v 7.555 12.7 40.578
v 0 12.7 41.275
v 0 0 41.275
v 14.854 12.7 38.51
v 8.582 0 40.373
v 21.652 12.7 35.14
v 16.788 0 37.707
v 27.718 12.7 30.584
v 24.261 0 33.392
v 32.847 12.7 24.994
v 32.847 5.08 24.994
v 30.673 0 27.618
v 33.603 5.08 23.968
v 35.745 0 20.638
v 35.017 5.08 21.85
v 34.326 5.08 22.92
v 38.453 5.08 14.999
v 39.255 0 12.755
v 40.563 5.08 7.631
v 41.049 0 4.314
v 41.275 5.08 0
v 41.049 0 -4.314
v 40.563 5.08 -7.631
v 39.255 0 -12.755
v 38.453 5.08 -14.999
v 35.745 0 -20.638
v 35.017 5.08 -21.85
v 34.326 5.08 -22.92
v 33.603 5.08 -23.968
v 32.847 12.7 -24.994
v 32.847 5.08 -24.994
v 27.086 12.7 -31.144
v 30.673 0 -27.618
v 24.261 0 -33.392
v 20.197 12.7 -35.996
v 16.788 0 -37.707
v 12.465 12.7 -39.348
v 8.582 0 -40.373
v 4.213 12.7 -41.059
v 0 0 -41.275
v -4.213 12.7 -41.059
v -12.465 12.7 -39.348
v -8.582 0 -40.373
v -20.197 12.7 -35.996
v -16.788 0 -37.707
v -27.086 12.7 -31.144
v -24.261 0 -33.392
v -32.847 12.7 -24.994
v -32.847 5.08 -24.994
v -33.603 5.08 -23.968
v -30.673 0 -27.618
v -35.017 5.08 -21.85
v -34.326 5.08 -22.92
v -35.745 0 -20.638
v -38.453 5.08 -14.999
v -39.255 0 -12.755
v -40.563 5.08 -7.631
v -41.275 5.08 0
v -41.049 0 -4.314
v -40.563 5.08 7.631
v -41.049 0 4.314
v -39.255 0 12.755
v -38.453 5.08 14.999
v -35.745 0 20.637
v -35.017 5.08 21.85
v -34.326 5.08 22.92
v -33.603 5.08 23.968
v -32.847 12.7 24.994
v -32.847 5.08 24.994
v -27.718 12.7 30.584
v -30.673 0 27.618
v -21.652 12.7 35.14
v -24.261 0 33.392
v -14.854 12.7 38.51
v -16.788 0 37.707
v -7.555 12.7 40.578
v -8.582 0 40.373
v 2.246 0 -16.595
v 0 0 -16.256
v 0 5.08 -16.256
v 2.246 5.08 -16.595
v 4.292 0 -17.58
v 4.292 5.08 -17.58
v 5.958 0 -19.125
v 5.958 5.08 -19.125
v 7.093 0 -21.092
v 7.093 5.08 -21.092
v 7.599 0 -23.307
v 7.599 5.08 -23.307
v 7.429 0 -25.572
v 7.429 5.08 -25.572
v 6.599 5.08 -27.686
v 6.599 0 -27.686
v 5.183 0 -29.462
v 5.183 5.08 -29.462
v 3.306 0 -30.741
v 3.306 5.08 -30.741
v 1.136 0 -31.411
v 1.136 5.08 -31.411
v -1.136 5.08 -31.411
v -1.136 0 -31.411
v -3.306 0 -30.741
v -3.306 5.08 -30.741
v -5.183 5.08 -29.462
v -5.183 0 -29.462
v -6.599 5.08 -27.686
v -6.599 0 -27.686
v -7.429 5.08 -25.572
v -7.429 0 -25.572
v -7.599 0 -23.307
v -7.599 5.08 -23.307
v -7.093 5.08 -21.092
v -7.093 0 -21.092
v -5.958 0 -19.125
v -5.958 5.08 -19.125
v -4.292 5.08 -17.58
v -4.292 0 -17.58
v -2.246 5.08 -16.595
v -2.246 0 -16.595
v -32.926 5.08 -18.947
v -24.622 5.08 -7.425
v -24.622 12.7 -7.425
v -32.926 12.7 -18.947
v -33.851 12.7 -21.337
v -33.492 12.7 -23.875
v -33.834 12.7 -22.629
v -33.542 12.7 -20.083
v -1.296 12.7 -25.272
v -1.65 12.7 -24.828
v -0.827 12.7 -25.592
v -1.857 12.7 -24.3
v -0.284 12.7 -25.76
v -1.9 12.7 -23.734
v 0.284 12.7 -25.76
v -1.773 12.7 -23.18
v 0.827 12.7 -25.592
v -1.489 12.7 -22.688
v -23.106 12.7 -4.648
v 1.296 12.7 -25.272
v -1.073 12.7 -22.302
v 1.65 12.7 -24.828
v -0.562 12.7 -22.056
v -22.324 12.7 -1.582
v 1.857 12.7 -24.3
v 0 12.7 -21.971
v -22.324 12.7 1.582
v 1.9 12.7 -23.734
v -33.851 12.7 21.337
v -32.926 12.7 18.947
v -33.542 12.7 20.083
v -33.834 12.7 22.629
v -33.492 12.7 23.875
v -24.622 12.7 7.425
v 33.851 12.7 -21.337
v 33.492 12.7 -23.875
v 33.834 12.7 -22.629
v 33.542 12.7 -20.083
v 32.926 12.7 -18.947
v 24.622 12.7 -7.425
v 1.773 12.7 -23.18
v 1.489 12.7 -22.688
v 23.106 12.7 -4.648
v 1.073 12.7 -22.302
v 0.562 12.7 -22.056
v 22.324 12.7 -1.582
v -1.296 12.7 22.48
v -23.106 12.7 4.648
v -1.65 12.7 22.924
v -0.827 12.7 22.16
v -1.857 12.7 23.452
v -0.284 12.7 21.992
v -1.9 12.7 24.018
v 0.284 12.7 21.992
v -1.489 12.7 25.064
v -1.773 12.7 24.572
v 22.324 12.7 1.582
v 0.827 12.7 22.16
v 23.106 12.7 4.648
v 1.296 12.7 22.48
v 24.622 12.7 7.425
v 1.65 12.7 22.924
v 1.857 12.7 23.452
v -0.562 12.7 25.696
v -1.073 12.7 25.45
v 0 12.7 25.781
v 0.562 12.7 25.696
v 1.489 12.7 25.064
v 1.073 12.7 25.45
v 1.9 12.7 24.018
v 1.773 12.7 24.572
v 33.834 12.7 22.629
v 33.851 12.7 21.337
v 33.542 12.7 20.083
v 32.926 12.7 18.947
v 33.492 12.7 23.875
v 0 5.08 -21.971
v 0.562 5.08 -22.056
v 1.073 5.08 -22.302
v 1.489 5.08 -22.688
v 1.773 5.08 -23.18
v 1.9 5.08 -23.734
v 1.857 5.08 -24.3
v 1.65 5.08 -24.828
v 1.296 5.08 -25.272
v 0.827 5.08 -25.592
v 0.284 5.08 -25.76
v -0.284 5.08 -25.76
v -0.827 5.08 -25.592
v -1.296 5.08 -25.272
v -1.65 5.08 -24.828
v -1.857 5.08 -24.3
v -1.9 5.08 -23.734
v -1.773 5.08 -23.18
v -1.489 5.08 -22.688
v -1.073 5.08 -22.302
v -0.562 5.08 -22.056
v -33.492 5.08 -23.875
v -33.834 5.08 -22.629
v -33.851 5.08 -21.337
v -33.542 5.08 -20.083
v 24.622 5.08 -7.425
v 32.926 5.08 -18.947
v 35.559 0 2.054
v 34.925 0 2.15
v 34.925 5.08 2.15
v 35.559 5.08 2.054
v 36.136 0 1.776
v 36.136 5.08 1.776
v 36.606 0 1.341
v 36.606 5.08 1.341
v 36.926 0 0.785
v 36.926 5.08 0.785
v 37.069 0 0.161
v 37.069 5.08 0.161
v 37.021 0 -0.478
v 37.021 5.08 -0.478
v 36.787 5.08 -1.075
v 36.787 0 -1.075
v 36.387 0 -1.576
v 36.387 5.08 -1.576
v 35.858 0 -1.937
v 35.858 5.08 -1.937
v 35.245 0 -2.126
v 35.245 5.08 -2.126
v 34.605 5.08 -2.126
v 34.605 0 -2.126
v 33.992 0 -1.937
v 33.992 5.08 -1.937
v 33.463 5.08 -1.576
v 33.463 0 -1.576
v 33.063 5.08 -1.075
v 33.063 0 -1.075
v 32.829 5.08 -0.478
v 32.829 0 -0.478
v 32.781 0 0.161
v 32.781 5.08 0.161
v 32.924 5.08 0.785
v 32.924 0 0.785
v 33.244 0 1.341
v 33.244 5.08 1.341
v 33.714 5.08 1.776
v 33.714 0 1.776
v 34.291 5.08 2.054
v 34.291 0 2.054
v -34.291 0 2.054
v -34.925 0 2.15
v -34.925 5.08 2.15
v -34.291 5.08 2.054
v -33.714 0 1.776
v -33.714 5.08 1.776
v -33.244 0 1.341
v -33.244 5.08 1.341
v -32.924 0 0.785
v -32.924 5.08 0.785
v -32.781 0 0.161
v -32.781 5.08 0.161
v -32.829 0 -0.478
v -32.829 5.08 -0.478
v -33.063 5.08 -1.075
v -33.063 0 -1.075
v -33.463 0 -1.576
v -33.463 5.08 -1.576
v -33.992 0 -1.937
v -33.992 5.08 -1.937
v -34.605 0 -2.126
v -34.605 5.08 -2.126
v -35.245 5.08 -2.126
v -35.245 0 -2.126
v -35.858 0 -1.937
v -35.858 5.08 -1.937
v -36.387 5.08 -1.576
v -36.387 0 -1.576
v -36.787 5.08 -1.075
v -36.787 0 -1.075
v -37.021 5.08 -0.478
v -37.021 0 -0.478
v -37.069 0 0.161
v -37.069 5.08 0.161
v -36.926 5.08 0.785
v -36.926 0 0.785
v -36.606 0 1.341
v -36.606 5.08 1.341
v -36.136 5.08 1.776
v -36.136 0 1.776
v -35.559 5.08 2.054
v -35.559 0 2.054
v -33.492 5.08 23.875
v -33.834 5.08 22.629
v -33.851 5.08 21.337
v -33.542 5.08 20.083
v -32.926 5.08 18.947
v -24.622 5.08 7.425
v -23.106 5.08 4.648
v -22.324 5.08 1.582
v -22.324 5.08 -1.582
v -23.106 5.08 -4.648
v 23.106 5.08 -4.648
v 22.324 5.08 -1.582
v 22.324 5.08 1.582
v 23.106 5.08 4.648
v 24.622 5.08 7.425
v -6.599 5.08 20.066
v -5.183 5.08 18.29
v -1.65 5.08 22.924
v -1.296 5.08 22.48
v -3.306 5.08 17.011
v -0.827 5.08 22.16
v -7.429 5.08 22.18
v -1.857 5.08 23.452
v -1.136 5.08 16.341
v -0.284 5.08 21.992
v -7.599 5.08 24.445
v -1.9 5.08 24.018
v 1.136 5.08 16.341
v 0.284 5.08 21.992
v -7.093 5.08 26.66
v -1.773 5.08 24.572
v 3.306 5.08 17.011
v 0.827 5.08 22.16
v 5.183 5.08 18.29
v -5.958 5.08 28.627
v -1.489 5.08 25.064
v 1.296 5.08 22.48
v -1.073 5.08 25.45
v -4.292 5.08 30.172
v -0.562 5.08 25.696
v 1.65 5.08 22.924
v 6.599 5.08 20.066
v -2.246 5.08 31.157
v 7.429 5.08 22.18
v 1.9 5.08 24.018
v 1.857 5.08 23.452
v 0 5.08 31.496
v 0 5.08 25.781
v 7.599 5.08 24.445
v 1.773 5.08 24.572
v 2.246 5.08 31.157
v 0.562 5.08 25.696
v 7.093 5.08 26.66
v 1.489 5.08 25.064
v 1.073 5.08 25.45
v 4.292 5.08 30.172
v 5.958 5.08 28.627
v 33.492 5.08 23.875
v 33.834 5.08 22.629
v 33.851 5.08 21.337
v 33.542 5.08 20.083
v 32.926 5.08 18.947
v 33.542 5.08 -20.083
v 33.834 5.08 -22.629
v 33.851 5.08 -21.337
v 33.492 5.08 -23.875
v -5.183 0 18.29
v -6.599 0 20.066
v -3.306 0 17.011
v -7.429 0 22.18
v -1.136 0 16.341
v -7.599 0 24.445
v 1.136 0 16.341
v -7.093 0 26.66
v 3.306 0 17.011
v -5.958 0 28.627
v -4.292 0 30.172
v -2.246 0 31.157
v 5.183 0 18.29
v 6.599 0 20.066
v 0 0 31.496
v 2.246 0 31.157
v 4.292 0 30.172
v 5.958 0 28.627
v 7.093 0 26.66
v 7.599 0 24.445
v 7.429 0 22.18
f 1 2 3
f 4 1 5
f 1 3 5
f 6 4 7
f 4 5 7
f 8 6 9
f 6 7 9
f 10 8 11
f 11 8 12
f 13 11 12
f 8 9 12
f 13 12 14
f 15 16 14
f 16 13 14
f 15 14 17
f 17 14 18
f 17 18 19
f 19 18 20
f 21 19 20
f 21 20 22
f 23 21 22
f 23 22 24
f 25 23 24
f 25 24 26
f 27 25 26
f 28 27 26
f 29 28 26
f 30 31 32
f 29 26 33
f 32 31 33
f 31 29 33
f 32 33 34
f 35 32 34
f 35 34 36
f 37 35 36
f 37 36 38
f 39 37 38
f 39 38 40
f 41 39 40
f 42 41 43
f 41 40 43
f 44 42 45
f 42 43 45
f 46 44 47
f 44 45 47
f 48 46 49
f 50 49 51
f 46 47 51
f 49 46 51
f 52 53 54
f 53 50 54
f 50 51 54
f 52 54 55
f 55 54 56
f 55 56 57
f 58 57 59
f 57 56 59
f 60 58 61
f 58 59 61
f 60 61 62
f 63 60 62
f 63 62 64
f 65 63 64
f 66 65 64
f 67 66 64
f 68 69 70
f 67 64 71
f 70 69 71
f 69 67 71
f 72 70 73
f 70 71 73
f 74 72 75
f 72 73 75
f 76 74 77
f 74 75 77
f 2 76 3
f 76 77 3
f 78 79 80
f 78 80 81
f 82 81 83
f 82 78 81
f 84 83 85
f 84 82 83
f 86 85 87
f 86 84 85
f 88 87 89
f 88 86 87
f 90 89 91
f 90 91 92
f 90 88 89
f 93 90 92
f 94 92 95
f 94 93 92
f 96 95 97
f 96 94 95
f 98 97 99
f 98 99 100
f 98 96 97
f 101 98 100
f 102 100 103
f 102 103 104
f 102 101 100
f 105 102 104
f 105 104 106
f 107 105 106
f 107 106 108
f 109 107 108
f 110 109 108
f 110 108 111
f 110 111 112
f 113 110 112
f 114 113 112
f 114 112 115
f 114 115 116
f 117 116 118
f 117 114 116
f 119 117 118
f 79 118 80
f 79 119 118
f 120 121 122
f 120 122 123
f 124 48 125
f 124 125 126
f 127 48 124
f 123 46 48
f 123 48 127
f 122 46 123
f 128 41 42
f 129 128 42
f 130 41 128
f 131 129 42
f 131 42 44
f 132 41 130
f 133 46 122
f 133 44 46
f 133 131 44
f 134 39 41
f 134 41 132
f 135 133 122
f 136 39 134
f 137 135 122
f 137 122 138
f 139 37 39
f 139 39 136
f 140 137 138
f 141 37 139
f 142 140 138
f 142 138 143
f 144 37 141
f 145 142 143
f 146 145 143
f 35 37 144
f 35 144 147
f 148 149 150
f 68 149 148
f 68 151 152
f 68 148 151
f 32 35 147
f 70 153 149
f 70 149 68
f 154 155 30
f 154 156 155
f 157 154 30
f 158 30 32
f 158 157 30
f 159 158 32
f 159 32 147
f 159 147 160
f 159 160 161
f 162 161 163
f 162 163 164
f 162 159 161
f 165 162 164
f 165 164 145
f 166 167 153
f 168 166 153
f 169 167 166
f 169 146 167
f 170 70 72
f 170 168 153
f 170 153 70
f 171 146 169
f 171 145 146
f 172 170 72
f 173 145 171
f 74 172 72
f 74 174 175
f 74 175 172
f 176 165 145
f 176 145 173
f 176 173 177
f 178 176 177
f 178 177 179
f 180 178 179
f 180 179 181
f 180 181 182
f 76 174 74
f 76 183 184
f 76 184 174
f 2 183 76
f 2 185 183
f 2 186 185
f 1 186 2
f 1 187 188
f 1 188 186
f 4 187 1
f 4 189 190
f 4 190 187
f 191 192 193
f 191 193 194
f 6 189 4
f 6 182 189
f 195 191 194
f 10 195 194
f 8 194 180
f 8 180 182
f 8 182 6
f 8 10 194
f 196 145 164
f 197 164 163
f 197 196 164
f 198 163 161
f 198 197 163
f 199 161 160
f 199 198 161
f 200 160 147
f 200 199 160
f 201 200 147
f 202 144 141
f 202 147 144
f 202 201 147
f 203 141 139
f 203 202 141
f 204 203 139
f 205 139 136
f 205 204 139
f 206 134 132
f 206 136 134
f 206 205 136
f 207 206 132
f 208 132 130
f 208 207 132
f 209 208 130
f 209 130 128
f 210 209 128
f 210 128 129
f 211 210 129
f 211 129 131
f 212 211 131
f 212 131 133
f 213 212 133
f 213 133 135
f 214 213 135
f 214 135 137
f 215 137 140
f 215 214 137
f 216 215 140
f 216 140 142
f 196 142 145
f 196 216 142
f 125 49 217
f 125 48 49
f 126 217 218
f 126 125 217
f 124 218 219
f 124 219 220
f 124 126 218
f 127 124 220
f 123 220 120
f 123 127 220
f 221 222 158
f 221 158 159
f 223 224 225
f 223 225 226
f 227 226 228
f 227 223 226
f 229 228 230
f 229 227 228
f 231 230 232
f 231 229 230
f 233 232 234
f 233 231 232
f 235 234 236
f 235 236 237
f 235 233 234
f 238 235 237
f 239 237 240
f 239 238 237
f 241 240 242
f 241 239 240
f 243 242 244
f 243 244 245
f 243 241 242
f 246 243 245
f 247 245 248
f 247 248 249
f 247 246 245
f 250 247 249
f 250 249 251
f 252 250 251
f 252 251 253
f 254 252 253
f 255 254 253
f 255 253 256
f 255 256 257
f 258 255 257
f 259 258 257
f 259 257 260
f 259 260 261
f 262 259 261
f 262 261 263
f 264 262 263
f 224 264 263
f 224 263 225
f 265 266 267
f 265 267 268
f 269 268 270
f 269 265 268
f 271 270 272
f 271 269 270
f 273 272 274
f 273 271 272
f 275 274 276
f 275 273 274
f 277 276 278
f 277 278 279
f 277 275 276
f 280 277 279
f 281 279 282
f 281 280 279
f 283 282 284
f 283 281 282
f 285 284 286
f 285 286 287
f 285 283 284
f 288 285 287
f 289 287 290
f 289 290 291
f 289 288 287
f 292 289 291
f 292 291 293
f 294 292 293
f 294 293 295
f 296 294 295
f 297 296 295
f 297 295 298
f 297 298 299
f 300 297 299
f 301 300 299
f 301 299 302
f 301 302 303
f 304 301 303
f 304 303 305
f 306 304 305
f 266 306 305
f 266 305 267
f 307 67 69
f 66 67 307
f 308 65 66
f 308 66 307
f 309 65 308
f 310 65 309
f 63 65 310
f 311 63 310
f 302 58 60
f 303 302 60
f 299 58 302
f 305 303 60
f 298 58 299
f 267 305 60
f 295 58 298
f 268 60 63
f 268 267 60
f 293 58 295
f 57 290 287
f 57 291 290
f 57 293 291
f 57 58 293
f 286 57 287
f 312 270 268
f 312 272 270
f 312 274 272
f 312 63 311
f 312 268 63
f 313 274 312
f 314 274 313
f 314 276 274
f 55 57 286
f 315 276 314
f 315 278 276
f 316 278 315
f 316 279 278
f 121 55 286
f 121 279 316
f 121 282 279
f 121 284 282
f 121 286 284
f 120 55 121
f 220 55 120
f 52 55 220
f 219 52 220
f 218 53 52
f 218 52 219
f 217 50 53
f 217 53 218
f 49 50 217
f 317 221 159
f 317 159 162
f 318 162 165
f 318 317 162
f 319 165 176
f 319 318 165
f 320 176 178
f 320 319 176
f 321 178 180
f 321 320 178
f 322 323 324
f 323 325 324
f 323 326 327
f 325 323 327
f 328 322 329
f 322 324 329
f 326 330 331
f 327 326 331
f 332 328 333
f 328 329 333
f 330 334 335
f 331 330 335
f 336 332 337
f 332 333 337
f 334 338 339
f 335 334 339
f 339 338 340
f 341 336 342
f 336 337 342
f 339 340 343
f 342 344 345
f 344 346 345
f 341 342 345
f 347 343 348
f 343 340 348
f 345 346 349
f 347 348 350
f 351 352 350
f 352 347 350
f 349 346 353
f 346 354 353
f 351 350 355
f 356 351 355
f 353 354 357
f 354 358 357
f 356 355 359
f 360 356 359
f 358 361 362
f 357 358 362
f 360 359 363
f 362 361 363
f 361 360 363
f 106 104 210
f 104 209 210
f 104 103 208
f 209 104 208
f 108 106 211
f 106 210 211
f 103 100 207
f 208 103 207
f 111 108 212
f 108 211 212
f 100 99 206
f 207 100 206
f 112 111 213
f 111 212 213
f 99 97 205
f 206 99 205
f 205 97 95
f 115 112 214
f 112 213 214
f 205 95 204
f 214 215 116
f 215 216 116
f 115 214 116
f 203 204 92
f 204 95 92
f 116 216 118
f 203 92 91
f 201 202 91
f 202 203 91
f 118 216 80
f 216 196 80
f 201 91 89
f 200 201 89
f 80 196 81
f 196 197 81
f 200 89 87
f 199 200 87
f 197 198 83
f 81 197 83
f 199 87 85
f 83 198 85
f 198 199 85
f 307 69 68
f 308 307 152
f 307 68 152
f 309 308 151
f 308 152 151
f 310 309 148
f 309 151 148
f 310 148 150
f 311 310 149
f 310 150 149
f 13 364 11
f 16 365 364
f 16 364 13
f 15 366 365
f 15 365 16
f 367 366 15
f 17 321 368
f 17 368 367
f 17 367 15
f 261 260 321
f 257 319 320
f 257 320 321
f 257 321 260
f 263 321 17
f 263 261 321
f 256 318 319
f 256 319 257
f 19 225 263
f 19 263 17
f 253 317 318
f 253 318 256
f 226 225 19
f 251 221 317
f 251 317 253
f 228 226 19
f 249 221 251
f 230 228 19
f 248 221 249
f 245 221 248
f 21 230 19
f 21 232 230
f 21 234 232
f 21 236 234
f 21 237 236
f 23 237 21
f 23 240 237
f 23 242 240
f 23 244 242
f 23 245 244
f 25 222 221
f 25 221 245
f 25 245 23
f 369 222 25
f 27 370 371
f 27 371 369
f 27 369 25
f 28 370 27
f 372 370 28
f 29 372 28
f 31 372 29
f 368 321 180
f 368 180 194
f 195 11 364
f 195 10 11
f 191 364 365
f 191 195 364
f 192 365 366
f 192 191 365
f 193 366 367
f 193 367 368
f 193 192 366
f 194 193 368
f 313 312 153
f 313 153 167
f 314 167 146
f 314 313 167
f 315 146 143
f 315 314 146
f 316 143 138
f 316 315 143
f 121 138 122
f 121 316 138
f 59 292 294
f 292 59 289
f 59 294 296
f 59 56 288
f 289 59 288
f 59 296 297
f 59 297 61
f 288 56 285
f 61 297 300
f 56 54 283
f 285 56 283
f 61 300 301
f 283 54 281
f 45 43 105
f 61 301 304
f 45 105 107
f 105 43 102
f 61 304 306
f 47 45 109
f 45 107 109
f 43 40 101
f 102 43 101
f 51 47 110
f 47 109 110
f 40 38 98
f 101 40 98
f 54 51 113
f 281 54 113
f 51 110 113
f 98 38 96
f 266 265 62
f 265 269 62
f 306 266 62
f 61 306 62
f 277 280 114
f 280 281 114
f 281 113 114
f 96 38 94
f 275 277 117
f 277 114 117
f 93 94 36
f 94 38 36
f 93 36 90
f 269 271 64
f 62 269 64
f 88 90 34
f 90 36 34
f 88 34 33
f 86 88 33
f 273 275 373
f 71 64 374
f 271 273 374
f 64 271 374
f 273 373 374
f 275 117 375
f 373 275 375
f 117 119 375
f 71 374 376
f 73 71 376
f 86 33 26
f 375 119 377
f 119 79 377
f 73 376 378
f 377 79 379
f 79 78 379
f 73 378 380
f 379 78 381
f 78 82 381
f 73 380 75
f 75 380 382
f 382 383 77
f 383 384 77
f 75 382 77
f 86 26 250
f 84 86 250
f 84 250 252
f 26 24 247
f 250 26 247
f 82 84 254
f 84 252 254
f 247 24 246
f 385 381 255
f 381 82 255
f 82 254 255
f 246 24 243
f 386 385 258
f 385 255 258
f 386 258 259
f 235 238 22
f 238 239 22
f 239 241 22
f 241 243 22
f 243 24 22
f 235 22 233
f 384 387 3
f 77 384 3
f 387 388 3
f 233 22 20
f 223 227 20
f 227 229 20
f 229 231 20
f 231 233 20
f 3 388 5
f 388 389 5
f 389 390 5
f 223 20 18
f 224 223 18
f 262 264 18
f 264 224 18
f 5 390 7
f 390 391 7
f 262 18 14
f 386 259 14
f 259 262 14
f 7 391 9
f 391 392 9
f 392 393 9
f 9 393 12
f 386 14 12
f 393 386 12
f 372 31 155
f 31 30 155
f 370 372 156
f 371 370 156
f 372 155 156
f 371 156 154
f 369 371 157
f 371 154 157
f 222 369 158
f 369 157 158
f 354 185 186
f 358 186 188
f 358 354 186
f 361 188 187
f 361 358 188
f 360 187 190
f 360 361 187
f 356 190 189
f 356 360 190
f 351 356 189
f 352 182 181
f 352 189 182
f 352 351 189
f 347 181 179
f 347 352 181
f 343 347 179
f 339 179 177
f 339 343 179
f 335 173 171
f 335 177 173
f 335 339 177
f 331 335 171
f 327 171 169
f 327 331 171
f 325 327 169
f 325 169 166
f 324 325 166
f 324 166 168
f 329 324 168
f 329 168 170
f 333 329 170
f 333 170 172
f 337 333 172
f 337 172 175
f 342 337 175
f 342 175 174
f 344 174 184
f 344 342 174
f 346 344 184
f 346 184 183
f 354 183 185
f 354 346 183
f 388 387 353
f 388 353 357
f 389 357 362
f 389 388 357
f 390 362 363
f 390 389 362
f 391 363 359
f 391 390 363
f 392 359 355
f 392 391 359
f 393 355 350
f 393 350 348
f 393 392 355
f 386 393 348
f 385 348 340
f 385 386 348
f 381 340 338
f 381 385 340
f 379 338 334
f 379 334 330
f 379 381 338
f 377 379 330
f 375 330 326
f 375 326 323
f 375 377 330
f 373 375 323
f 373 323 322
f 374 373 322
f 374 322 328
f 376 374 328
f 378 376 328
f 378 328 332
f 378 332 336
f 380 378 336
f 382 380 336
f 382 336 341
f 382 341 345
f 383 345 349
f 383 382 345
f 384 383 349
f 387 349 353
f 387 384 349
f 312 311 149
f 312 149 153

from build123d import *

# Parameters (mm, degrees)
SKETCH1_R           = 41.275
BOSS_EXTRUDE1_DEPTH = 12.7
SKETCH1_4_R         = 2.15
SKETCH1_4_R_2       = 1.905
CUT_EXTRUDE2_DEPTH  = 60.737268518
SKETCH1_5_R         = 7.62
SKETCH1_5_R_2       = 1.905
CUT_EXTRUDE3_DEPTH  = 5.08
CUT_EXTRUDE4_START  = 5.08
SKETCH1_6_R         = 2.15
CUT_EXTRUDE4_DEPTH  = 7.62
FILLET1_R           = 5.08


with BuildPart() as part:
    # Sketch1 → Boss-Extrude1 (new body)
    with BuildSketch(Plane(origin=(0, 0, 0), x_dir=(1, 0, 0), z_dir=(0, 1, 0))):
        with Locations(Location((0, 0, 0), (0, 0, 270))):
            Circle(SKETCH1_R)
    extrude(amount=BOSS_EXTRUDE1_DEPTH)

    # Sketch1<4> → Cut-Extrude2 (cut, through all)
    with BuildSketch(Plane(origin=(0, 0, 0), x_dir=(1, 0, 0), z_dir=(0, 1, 0))):
        with Locations(Location((-34.925, 0, 0), (0, 0, 270))):
            Circle(SKETCH1_4_R)
        with Locations(Location((34.925, 0, 0), (0, 0, 270))):
            Circle(SKETCH1_4_R)
        with Locations(Location((0, 23.876, 0), (0, 0, 270))):
            Circle(SKETCH1_4_R_2)
        with Locations(Location((0, -23.876, 0), (0, 0, 270))):
            Circle(SKETCH1_4_R_2)
    extrude(amount=CUT_EXTRUDE2_DEPTH, mode=Mode.SUBTRACT)

    # Sketch1<5> → Cut-Extrude3 (cut)
    # profile 1 of 2: a face of its own
    with BuildSketch(Plane(origin=(0, 0, 0), x_dir=(1, 0, 0), z_dir=(0, 1, 0))):
        with Locations(Location((0, -23.876, 0), (0, 0, 270))):
            Circle(SKETCH1_5_R)
        with Locations(Location((0, -23.876, 0), (0, 0, 270))):
            Circle(SKETCH1_5_R_2, mode=Mode.SUBTRACT)
    # profile 2 of 2: a face of its own
    with BuildSketch(Plane(origin=(0, 0, 0), x_dir=(1, 0, 0), z_dir=(0, 1, 0))):
        with Locations(Location((0, 23.876, 0), (0, 0, 270))):
            Circle(SKETCH1_5_R)
        with Locations(Location((0, 23.876, 0), (0, 0, 270))):
            Circle(SKETCH1_5_R_2, mode=Mode.SUBTRACT)
    extrude(amount=CUT_EXTRUDE3_DEPTH, mode=Mode.SUBTRACT)

    # Sketch1<6> → Cut-Extrude4 (cut)
    # profile 1 of 2: a face of its own
    with BuildSketch(Plane(origin=(0, 0, 0), x_dir=(1, 0, 0), z_dir=(0, 1, 0)).offset(CUT_EXTRUDE4_START)):
        with BuildLine():
            ThreePointArc((-35.017363636, 21.849710958), (-41.275, 0), (-35.017363636, -21.849710958))
            Line((-35.017363636, -21.849710958), (-24.621881181, -7.425344611))
            ThreePointArc((-24.621881181, -7.425344611), (-22.225, 0), (-24.621881181, 7.425344611))
            Line((-24.621881181, 7.425344611), (-35.017363636, 21.849710958))
        make_face()
        with Locations(Location((-34.925, 0, 0), (0, 0, 270))):
            Circle(SKETCH1_6_R, mode=Mode.SUBTRACT)
    # profile 2 of 2: a face of its own
    with BuildSketch(Plane(origin=(0, 0, 0), x_dir=(1, 0, 0), z_dir=(0, 1, 0)).offset(CUT_EXTRUDE4_START)):
        with BuildLine():
            Line((35.017363636, 21.849710958), (24.621881181, 7.425344611))
            ThreePointArc((24.621881181, 7.425344611), (22.225, 0), (24.621881181, -7.425344611))
            Line((24.621881181, -7.425344611), (35.017363636, -21.849710958))
            ThreePointArc((35.017363636, -21.849710958), (41.275, 0), (35.017363636, 21.849710958))
        make_face()
        with Locations(Location((34.925, 0, 0), (0, 0, 270))):
            Circle(SKETCH1_6_R, mode=Mode.SUBTRACT)
    extrude(amount=CUT_EXTRUDE4_DEPTH, mode=Mode.SUBTRACT)

    # Fillet1
    fillet1_edges = [part.edges().sort_by_distance(p)[0] for p in [
        (35.017363636, 8.89, -21.849710958),
        (35.017363636, 8.89, 21.849710958),
        (-35.017363636, 8.89, 21.849710958),
        (-35.017363636, 8.89, -21.849710958),
    ]]
    fillet(fillet1_edges, radius=FILLET1_R)


solid = part.part
